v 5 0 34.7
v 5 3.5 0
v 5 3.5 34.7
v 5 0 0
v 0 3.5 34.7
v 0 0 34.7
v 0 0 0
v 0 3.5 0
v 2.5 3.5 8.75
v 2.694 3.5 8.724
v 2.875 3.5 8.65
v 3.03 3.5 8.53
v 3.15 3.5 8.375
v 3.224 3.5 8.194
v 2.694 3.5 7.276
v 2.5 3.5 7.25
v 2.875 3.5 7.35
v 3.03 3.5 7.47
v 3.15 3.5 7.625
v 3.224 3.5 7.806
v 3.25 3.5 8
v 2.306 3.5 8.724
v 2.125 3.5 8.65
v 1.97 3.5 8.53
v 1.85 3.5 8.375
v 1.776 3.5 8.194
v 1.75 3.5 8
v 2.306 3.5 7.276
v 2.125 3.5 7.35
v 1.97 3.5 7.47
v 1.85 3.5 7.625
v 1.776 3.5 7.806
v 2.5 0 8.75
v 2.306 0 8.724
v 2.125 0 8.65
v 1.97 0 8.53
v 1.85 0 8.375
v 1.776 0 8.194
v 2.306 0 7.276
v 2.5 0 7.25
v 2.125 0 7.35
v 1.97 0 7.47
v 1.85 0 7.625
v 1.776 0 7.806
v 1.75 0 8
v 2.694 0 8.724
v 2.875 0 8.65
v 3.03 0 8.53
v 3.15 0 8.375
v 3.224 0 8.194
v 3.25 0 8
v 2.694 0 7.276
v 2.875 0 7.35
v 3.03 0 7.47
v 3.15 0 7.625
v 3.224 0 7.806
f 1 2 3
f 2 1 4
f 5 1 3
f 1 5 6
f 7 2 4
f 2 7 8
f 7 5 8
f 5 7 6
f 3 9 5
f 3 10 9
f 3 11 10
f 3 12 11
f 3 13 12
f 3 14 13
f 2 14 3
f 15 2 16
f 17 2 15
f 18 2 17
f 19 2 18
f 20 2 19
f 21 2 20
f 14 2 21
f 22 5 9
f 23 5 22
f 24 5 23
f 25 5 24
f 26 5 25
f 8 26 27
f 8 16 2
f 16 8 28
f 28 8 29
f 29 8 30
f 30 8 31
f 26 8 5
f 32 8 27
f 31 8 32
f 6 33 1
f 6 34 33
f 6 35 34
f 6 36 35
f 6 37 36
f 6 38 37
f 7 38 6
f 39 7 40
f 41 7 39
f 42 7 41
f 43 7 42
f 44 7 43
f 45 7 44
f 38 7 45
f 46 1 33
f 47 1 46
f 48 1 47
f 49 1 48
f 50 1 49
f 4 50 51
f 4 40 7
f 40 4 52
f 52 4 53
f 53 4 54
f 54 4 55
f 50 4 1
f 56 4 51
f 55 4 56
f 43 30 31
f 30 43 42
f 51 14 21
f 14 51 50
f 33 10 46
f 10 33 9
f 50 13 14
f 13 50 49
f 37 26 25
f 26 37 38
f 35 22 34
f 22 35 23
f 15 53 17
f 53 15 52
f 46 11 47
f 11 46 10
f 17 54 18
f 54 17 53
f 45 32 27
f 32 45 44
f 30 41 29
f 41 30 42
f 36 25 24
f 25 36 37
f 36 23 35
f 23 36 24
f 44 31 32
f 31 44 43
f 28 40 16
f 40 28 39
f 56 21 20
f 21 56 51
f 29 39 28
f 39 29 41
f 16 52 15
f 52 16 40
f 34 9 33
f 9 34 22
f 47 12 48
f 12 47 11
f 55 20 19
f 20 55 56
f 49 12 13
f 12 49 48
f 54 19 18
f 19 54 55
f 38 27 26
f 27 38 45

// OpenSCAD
// part_id: fp8
// name: Front plate support post (tall)
// source_drawing_ids: DRW-010
// units: mm
// revision: 0.1
// SPDX-License-Identifier: MIT

module part_fp8(
    width = 5.0,
    depth = 3.5,
    height = 34.7,
    hole_d = 1.5,
    hole_z = 8.0
) {
    difference() {
        cube([width, depth, height], center = false);
        translate([width / 2, depth / 2, hole_z]) rotate([90, 0, 0])
            cylinder(d = hole_d, h = depth + 0.2, center = true, $fn = 24);
    }
}

// ---- "main guard" ----
// Default to previewing when opened directly:
if (is_undef(__LIB_MODE__)) {
    part_fp8();
}
